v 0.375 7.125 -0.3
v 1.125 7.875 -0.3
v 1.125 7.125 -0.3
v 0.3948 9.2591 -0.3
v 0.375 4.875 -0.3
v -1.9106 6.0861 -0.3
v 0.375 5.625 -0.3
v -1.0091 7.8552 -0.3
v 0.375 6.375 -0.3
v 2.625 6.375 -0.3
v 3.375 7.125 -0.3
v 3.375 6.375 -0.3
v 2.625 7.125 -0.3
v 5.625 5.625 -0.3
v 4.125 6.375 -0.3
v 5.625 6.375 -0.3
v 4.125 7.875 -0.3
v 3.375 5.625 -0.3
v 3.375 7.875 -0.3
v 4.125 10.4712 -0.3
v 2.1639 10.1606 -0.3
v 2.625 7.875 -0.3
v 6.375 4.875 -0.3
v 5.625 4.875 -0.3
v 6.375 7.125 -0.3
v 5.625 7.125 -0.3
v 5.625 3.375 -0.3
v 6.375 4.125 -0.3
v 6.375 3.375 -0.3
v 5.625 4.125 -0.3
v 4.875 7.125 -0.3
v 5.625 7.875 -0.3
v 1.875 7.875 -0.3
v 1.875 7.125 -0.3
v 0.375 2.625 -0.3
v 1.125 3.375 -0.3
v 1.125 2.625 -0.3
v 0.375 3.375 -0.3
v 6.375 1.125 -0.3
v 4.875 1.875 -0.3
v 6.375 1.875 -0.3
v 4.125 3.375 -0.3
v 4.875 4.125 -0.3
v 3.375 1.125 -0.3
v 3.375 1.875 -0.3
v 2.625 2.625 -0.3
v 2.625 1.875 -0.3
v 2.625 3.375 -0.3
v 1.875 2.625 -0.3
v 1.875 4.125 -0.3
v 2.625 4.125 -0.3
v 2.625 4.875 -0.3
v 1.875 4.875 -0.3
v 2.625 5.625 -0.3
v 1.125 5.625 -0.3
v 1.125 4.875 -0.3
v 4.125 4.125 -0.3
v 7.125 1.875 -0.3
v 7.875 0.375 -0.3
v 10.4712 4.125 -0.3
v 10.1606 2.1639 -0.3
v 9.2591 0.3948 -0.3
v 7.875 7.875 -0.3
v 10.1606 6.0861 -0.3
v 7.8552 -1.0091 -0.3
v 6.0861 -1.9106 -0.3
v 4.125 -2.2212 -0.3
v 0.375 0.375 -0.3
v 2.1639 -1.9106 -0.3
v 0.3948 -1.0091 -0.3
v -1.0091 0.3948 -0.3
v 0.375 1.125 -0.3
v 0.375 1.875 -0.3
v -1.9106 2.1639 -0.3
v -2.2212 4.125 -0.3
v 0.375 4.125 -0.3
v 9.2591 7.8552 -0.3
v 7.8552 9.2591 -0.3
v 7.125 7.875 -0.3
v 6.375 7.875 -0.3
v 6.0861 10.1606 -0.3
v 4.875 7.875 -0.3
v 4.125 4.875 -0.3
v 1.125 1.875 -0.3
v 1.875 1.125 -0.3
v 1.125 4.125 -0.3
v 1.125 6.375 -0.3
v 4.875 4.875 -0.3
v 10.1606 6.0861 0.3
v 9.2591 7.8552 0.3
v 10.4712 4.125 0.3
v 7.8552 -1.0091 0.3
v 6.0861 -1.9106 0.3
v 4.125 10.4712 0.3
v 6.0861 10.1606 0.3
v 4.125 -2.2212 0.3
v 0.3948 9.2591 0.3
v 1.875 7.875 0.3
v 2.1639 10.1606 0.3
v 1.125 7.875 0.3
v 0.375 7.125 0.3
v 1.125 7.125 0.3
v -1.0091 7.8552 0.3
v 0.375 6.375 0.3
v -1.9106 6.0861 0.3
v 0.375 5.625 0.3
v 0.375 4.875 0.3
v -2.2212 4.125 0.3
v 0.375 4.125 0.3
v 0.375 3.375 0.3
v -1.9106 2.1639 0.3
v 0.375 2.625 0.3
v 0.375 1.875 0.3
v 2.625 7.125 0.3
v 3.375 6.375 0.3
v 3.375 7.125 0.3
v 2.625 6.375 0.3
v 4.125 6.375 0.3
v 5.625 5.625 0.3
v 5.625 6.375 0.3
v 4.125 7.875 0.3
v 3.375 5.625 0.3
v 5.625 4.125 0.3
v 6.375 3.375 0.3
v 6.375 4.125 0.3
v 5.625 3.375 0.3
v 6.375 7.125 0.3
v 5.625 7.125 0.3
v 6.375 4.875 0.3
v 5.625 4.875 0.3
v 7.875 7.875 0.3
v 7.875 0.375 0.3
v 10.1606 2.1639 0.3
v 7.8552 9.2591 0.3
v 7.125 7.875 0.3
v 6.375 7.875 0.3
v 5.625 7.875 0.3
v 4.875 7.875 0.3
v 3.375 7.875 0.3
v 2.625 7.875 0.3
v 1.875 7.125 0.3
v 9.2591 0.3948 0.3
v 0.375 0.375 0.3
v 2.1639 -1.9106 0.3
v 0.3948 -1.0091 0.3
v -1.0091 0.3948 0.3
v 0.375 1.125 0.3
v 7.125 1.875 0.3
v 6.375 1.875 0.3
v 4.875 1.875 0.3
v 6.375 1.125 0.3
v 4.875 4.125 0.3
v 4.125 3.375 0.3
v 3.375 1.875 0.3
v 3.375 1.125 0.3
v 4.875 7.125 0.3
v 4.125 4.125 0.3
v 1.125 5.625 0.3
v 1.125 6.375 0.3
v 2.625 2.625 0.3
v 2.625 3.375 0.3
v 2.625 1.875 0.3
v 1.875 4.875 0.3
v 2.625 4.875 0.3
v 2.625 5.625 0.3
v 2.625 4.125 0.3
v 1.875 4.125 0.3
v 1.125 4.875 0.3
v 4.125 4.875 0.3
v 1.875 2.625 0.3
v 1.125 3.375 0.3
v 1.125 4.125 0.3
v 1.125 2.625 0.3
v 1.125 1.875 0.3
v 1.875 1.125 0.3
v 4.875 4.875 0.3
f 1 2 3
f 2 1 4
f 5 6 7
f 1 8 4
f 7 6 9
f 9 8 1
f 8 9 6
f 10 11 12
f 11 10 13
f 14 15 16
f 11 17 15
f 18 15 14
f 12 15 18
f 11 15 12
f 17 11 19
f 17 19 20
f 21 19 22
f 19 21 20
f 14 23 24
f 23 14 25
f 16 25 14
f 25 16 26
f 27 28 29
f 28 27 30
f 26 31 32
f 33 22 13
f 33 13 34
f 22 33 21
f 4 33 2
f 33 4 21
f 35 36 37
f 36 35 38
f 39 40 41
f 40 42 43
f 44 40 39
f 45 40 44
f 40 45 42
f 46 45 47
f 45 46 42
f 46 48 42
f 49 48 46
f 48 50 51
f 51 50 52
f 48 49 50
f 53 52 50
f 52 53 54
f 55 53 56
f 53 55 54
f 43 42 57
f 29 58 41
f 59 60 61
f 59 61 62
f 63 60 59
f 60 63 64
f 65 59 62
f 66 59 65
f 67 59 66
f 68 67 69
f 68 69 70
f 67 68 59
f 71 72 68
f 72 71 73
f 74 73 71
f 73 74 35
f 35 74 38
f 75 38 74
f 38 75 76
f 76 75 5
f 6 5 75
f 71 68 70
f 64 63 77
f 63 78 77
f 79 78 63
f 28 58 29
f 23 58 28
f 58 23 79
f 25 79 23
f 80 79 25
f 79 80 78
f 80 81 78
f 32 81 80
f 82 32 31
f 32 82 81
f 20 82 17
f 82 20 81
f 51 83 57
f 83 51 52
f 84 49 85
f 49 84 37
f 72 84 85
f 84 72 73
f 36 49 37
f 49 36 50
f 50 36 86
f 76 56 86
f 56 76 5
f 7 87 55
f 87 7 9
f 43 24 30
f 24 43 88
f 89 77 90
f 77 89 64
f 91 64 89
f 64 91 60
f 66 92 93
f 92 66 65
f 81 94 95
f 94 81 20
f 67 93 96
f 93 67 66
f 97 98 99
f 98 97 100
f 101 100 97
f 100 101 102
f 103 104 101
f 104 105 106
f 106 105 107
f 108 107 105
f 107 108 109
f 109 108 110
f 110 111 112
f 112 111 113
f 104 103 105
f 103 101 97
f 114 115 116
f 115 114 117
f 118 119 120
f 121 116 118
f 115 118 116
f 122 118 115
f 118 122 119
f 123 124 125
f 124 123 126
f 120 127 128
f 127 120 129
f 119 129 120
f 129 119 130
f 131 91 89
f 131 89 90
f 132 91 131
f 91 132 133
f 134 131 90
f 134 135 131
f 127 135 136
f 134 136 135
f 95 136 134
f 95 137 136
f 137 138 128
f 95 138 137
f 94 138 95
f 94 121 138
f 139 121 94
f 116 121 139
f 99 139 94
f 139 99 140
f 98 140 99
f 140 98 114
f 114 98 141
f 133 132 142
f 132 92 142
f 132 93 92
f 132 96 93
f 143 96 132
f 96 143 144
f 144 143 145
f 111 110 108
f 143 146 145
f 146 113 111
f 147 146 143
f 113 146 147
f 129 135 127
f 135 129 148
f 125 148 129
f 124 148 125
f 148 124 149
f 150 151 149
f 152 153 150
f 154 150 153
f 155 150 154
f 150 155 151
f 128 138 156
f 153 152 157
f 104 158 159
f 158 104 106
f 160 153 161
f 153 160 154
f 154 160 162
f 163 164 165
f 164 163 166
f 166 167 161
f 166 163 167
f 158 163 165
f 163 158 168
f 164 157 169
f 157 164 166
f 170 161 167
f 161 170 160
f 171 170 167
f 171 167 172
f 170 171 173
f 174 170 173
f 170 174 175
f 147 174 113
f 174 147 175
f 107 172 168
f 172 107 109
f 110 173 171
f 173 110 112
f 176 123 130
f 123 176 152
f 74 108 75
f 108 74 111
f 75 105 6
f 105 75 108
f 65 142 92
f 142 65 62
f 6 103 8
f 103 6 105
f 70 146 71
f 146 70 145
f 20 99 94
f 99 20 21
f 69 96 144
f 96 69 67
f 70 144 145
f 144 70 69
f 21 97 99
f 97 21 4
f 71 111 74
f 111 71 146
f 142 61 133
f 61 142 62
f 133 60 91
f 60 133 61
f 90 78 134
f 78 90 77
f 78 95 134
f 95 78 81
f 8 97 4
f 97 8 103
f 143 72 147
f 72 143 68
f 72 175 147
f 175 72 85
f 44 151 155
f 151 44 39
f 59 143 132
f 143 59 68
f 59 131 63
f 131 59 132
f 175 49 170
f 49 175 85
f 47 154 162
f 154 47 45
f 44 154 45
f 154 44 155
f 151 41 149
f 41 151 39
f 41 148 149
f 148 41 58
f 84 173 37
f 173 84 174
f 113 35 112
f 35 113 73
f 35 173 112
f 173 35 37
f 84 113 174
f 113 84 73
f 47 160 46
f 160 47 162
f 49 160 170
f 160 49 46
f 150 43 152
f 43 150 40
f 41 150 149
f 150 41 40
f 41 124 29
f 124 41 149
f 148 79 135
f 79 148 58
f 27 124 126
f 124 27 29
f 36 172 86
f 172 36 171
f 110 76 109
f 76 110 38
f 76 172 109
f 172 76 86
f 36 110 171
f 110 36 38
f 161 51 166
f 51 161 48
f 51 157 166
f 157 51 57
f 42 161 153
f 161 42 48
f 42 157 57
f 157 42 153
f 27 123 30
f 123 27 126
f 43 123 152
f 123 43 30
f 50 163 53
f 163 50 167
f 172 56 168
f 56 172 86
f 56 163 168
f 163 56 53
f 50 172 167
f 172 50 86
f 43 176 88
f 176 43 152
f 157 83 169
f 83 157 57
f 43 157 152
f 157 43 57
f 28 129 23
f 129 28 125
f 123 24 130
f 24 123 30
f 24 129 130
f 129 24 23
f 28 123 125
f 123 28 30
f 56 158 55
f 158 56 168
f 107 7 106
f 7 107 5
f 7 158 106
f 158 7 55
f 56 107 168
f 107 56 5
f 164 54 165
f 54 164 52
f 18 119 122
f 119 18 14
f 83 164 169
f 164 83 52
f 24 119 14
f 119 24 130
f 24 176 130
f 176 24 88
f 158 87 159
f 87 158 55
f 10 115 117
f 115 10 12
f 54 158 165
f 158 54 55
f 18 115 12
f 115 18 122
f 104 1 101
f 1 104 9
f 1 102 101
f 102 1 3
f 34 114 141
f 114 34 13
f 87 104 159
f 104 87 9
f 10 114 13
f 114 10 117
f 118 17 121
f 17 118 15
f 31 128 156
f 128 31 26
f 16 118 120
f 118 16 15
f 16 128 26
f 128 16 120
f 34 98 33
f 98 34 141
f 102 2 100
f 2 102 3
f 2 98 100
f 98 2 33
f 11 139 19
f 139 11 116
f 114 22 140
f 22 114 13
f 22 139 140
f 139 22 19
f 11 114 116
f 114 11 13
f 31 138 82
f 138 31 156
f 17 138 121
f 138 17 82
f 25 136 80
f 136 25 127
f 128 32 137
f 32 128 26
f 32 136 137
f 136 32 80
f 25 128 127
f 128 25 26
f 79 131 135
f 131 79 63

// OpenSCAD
rotate([0,0,0])difference(){translate([4.125,4.125,0])  cylinder(r=6.34615384615385,h=0.6, center=true);
translate([0.75,0.75,0])  cube(size = [0.75,0.75,0.6], center=true);
translate([1.5,0.75,0])  cube(size = [0.75,0.75,0.6], center=true);
translate([2.25,0.75,0])  cube(size = [0.75,0.75,0.6], center=true);
translate([3,0.75,0])  cube(size = [0.75,0.75,0.6], center=true);
translate([3.75,0.75,0])  cube(size = [0.75,0.75,0.6], center=true);
translate([4.5,0.75,0])  cube(size = [0.75,0.75,0.6], center=true);
translate([5.25,0.75,0])  cube(size = [0.75,0.75,0.6], center=true);
translate([6,0.75,0])  cube(size = [0.75,0.75,0.6], center=true);
translate([6.75,0.75,0])  cube(size = [0.75,0.75,0.6], center=true);
translate([7.5,0.75,0])  cube(size = [0.75,0.75,0.6], center=true);
translate([7.5,0.75,0])  cube(size = [0.75,0.75,0.6], center=true);
translate([7.5,0.75,0])  cube(size = [0.75,0.75,0.6], center=true);
translate([2.25,1.5,0])  cube(size = [0.75,0.75,0.6], center=true);
translate([3,1.5,0])  cube(size = [0.75,0.75,0.6], center=true);
translate([3,1.5,0])  cube(size = [0.75,0.75,0.6], center=true);
translate([3,1.5,0])  cube(size = [0.75,0.75,0.6], center=true);
translate([3,1.5,0])  cube(size = [0.75,0.75,0.6], center=true);
translate([3,1.5,0])  cube(size = [0.75,0.75,0.6], center=true);
translate([6.75,1.5,0])  cube(size = [0.75,0.75,0.6], center=true);
translate([7.5,1.5,0])  cube(size = [0.75,0.75,0.6], center=true);
translate([0.75,2.25,0])  cube(size = [0.75,0.75,0.6], center=true);
translate([0.75,2.25,0])  cube(size = [0.75,0.75,0.6], center=true);
translate([2.25,2.25,0])  cube(size = [0.75,0.75,0.6], center=true);
translate([2.25,2.25,0])  cube(size = [0.75,0.75,0.6], center=true);
translate([2.25,2.25,0])  cube(size = [0.75,0.75,0.6], center=true);
translate([2.25,2.25,0])  cube(size = [0.75,0.75,0.6], center=true);
translate([5.25,2.25,0])  cube(size = [0.75,0.75,0.6], center=true);
translate([6,2.25,0])  cube(size = [0.75,0.75,0.6], center=true);
translate([6,2.25,0])  cube(size = [0.75,0.75,0.6], center=true);
translate([7.5,2.25,0])  cube(size = [0.75,0.75,0.6], center=true);
translate([7.5,2.25,0])  cube(size = [0.75,0.75,0.6], center=true);
translate([7.5,2.25,0])  cube(size = [0.75,0.75,0.6], center=true);
translate([7.5,2.25,0])  cube(size = [0.75,0.75,0.6], center=true);
translate([7.5,2.25,0])  cube(size = [0.75,0.75,0.6], center=true);
translate([7.5,2.25,0])  cube(size = [0.75,0.75,0.6], center=true);
translate([7.5,2.25,0])  cube(size = [0.75,0.75,0.6], center=true);
translate([5.25,3,0])  cube(size = [0.75,0.75,0.6], center=true);
translate([6,3,0])  cube(size = [0.75,0.75,0.6], center=true);
translate([6,3,0])  cube(size = [0.75,0.75,0.6], center=true);
translate([7.5,3,0])  cube(size = [0.75,0.75,0.6], center=true);
translate([0.75,3.75,0])  cube(size = [0.75,0.75,0.6], center=true);
translate([0.75,3.75,0])  cube(size = [0.75,0.75,0.6], center=true);
translate([0.75,3.75,0])  cube(size = [0.75,0.75,0.6], center=true);
translate([3,3.75,0])  cube(size = [0.75,0.75,0.6], center=true);
translate([3.75,3.75,0])  cube(size = [0.75,0.75,0.6], center=true);
translate([3.75,3.75,0])  cube(size = [0.75,0.75,0.6], center=true);
translate([5.25,3.75,0])  cube(size = [0.75,0.75,0.6], center=true);
translate([5.25,3.75,0])  cube(size = [0.75,0.75,0.6], center=true);
translate([5.25,3.75,0])  cube(size = [0.75,0.75,0.6], center=true);
translate([7.5,3.75,0])  cube(size = [0.75,0.75,0.6], center=true);
translate([7.5,3.75,0])  cube(size = [0.75,0.75,0.6], center=true);
translate([1.5,4.5,0])  cube(size = [0.75,0.75,0.6], center=true);
translate([1.5,4.5,0])  cube(size = [0.75,0.75,0.6], center=true);
translate([1.5,4.5,0])  cube(size = [0.75,0.75,0.6], center=true);
translate([1.5,4.5,0])  cube(size = [0.75,0.75,0.6], center=true);
translate([4.5,4.5,0])  cube(size = [0.75,0.75,0.6], center=true);
translate([4.5,4.5,0])  cube(size = [0.75,0.75,0.6], center=true);
translate([6,4.5,0])  cube(size = [0.75,0.75,0.6], center=true);
translate([6,4.5,0])  cube(size = [0.75,0.75,0.6], center=true);
translate([7.5,4.5,0])  cube(size = [0.75,0.75,0.6], center=true);
translate([0.75,5.25,0])  cube(size = [0.75,0.75,0.6], center=true);
translate([0.75,5.25,0])  cube(size = [0.75,0.75,0.6], center=true);
translate([0.75,5.25,0])  cube(size = [0.75,0.75,0.6], center=true);
translate([3,5.25,0])  cube(size = [0.75,0.75,0.6], center=true);
translate([3.75,5.25,0])  cube(size = [0.75,0.75,0.6], center=true);
translate([4.5,5.25,0])  cube(size = [0.75,0.75,0.6], center=true);
translate([5.25,5.25,0])  cube(size = [0.75,0.75,0.6], center=true);
translate([5.25,5.25,0])  cube(size = [0.75,0.75,0.6], center=true);
translate([5.25,5.25,0])  cube(size = [0.75,0.75,0.6], center=true);
translate([7.5,5.25,0])  cube(size = [0.75,0.75,0.6], center=true);
translate([7.5,5.25,0])  cube(size = [0.75,0.75,0.6], center=true);
translate([1.5,6,0])  cube(size = [0.75,0.75,0.6], center=true);
translate([2.25,6,0])  cube(size = [0.75,0.75,0.6], center=true);
translate([3,6,0])  cube(size = [0.75,0.75,0.6], center=true);
translate([3,6,0])  cube(size = [0.75,0.75,0.6], center=true);
translate([3,6,0])  cube(size = [0.75,0.75,0.6], center=true);
translate([3,6,0])  cube(size = [0.75,0.75,0.6], center=true);
translate([3,6,0])  cube(size = [0.75,0.75,0.6], center=true);
translate([3,6,0])  cube(size = [0.75,0.75,0.6], center=true);
translate([7.5,6,0])  cube(size = [0.75,0.75,0.6], center=true);
translate([0.75,6.75,0])  cube(size = [0.75,0.75,0.6], center=true);
translate([1.5,6.75,0])  cube(size = [0.75,0.75,0.6], center=true);
translate([2.25,6.75,0])  cube(size = [0.75,0.75,0.6], center=true);
translate([2.25,6.75,0])  cube(size = [0.75,0.75,0.6], center=true);
translate([2.25,6.75,0])  cube(size = [0.75,0.75,0.6], center=true);
translate([4.5,6.75,0])  cube(size = [0.75,0.75,0.6], center=true);
translate([5.25,6.75,0])  cube(size = [0.75,0.75,0.6], center=true);
translate([5.25,6.75,0])  cube(size = [0.75,0.75,0.6], center=true);
translate([5.25,6.75,0])  cube(size = [0.75,0.75,0.6], center=true);
translate([7.5,6.75,0])  cube(size = [0.75,0.75,0.6], center=true);
translate([7.5,6.75,0])  cube(size = [0.75,0.75,0.6], center=true);
translate([1.5,7.5,0])  cube(size = [0.75,0.75,0.6], center=true);
translate([1.5,7.5,0])  cube(size = [0.75,0.75,0.6], center=true);
translate([3,7.5,0])  cube(size = [0.75,0.75,0.6], center=true);
translate([3,7.5,0])  cube(size = [0.75,0.75,0.6], center=true);
translate([4.5,7.5,0])  cube(size = [0.75,0.75,0.6], center=true);
translate([4.5,7.5,0])  cube(size = [0.75,0.75,0.6], center=true);
translate([6,7.5,0])  cube(size = [0.75,0.75,0.6], center=true);
translate([6,7.5,0])  cube(size = [0.75,0.75,0.6], center=true);
translate([7.5,7.5,0])  cube(size = [0.75,0.75,0.6], center=true);
}
